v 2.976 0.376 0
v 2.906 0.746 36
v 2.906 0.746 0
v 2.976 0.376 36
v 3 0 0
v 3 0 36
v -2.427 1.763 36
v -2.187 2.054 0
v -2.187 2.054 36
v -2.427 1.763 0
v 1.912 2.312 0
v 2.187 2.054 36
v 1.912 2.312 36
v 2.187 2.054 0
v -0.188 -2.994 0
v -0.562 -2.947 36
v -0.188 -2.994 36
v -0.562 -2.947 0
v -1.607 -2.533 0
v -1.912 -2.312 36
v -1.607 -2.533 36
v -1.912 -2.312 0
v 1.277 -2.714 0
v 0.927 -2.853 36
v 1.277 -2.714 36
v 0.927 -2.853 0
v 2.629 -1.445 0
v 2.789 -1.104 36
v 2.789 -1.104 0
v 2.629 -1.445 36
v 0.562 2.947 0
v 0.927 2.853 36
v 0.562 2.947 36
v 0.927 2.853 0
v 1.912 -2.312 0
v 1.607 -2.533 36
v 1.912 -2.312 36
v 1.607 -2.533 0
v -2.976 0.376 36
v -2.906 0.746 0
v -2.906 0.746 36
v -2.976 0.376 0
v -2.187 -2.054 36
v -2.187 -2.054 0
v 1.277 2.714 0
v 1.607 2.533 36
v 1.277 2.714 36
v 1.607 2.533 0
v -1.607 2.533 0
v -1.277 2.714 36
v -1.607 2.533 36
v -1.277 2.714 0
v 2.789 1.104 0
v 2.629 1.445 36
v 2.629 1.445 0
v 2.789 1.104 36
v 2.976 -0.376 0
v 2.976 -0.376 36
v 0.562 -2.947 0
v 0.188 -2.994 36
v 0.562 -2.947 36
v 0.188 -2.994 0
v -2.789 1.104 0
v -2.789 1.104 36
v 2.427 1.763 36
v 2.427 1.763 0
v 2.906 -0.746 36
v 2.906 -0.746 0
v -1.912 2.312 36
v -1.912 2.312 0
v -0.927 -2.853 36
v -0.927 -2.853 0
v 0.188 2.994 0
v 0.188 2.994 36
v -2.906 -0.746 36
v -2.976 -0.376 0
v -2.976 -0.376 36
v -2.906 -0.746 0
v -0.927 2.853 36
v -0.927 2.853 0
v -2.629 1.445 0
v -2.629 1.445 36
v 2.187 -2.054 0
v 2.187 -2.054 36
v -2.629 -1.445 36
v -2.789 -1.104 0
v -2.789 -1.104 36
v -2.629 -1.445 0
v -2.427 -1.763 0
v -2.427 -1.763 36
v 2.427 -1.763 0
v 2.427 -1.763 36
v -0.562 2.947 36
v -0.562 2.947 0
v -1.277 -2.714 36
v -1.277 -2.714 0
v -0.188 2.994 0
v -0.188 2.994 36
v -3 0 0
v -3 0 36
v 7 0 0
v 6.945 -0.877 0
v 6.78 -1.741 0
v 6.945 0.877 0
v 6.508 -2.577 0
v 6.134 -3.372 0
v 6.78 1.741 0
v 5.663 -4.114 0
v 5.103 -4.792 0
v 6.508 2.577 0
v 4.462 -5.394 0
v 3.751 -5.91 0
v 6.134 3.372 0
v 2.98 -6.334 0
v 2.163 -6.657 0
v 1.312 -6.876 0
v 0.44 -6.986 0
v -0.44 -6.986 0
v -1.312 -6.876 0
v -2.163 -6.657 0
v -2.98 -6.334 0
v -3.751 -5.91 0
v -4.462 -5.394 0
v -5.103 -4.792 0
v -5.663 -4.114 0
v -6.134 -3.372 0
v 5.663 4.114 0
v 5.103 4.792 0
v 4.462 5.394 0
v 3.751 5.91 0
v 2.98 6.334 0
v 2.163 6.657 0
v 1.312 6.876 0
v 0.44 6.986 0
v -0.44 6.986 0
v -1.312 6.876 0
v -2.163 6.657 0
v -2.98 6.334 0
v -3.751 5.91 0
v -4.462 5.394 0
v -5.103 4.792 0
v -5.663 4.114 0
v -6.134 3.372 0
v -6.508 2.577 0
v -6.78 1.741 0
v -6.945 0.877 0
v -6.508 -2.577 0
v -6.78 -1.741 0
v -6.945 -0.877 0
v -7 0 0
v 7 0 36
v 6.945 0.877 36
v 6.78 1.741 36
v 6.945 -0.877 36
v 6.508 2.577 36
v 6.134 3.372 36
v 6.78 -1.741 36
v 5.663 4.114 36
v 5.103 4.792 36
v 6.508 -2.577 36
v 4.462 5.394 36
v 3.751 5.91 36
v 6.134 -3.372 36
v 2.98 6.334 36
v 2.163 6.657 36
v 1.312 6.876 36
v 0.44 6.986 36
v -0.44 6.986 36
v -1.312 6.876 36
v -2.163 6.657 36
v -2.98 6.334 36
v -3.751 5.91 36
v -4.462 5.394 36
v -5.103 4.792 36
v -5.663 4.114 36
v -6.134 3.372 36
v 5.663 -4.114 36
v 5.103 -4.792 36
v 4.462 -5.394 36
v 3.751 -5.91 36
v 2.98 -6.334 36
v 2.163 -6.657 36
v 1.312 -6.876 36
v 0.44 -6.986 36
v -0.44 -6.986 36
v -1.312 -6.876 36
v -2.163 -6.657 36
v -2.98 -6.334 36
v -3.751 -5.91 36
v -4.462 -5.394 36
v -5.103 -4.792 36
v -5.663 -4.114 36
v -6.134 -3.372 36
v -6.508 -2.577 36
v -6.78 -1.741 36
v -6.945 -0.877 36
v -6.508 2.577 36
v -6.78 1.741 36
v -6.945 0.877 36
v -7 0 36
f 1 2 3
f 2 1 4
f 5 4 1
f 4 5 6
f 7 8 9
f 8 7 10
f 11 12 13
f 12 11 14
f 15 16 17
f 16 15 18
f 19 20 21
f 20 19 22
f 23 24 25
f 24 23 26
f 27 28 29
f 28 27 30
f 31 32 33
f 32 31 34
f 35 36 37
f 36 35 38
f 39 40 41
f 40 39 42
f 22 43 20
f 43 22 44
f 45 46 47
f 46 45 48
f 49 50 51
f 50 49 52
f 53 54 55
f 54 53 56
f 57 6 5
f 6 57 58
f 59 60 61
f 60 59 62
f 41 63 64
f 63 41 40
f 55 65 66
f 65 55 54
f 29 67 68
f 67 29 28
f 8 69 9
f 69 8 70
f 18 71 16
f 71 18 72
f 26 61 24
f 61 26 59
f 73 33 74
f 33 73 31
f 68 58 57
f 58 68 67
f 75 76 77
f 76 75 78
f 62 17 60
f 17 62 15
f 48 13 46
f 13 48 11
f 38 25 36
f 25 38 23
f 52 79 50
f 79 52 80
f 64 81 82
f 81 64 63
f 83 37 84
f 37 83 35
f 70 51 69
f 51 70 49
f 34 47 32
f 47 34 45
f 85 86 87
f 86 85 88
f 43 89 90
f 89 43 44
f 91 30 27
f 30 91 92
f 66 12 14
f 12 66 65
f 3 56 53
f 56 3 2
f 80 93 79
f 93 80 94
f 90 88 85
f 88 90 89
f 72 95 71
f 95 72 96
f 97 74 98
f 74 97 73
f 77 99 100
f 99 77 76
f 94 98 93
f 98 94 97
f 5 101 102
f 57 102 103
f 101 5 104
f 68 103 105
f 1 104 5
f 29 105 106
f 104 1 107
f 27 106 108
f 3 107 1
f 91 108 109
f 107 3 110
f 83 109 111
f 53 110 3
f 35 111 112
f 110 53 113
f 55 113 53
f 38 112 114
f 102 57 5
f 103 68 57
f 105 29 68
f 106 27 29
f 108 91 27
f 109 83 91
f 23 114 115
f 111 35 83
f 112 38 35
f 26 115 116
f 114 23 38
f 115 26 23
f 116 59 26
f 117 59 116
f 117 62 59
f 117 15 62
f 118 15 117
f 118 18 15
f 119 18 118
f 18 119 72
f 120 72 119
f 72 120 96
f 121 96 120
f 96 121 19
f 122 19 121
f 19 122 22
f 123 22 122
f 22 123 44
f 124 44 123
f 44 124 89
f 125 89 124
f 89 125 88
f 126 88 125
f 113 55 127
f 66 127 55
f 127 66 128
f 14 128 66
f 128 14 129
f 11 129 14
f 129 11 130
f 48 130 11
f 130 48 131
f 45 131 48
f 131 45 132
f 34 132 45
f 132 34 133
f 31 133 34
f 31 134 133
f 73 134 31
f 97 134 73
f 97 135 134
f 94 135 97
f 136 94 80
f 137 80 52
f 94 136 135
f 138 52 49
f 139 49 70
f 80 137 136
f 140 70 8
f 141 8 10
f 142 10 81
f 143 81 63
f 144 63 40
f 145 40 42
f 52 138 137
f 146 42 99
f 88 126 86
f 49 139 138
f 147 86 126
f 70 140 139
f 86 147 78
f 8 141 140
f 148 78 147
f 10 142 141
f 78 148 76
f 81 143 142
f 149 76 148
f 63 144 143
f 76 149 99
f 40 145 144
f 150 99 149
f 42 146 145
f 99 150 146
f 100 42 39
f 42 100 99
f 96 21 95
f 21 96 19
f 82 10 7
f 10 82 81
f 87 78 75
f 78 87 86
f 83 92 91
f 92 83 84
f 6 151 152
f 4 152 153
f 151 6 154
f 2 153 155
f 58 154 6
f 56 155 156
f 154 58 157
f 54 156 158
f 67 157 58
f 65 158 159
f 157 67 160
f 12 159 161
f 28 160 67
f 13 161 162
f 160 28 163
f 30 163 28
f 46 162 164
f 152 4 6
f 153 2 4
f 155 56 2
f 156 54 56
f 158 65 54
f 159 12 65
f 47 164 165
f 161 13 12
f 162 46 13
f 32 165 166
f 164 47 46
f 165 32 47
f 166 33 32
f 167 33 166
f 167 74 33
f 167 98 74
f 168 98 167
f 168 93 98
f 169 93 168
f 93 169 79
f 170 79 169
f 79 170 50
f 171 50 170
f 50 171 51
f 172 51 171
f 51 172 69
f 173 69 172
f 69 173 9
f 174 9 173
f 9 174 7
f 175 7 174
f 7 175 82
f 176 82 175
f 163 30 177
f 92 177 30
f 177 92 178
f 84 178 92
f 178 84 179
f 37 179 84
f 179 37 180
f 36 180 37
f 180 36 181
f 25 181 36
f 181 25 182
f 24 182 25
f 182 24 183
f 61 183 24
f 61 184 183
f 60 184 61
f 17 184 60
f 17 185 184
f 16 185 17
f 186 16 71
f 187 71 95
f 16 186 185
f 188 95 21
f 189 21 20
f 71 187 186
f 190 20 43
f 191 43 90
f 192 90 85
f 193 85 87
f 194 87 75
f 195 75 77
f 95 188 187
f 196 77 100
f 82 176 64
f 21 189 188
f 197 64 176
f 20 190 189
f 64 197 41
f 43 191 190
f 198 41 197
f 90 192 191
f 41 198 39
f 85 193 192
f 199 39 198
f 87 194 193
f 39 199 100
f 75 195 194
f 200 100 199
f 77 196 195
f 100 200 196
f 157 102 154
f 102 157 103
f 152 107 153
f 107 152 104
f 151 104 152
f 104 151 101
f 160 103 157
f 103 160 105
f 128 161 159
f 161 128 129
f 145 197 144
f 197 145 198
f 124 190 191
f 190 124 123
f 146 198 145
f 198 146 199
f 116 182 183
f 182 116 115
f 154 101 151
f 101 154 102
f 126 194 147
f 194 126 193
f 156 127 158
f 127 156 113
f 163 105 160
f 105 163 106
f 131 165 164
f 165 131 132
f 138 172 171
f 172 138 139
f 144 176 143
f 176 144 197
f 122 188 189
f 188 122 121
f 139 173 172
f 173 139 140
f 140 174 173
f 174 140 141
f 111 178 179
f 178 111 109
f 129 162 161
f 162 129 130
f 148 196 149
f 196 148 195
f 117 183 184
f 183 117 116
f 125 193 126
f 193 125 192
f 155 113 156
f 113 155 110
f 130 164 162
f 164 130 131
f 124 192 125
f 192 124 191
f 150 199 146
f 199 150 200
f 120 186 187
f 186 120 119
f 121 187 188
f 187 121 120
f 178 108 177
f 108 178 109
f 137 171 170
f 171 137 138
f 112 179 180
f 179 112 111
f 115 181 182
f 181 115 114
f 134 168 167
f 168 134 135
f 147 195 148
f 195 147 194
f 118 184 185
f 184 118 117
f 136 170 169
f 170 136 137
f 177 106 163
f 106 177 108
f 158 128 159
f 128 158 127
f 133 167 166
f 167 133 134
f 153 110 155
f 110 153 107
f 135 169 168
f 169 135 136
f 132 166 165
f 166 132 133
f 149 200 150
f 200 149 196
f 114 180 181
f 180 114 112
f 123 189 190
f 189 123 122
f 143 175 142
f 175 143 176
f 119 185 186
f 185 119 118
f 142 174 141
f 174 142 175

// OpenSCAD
$fn = 50;


difference() {
	union() {
		cylinder(h = 36, r = 7.0000000000);
	}
	union() {
		cylinder(h = 36, r = 3.0000000000);
		cylinder(h = 36, r = 1.5000000000);
		cylinder(h = 36, r = 1.5000000000);
		cylinder(h = 36, r = 1.5000000000);
	}
}
